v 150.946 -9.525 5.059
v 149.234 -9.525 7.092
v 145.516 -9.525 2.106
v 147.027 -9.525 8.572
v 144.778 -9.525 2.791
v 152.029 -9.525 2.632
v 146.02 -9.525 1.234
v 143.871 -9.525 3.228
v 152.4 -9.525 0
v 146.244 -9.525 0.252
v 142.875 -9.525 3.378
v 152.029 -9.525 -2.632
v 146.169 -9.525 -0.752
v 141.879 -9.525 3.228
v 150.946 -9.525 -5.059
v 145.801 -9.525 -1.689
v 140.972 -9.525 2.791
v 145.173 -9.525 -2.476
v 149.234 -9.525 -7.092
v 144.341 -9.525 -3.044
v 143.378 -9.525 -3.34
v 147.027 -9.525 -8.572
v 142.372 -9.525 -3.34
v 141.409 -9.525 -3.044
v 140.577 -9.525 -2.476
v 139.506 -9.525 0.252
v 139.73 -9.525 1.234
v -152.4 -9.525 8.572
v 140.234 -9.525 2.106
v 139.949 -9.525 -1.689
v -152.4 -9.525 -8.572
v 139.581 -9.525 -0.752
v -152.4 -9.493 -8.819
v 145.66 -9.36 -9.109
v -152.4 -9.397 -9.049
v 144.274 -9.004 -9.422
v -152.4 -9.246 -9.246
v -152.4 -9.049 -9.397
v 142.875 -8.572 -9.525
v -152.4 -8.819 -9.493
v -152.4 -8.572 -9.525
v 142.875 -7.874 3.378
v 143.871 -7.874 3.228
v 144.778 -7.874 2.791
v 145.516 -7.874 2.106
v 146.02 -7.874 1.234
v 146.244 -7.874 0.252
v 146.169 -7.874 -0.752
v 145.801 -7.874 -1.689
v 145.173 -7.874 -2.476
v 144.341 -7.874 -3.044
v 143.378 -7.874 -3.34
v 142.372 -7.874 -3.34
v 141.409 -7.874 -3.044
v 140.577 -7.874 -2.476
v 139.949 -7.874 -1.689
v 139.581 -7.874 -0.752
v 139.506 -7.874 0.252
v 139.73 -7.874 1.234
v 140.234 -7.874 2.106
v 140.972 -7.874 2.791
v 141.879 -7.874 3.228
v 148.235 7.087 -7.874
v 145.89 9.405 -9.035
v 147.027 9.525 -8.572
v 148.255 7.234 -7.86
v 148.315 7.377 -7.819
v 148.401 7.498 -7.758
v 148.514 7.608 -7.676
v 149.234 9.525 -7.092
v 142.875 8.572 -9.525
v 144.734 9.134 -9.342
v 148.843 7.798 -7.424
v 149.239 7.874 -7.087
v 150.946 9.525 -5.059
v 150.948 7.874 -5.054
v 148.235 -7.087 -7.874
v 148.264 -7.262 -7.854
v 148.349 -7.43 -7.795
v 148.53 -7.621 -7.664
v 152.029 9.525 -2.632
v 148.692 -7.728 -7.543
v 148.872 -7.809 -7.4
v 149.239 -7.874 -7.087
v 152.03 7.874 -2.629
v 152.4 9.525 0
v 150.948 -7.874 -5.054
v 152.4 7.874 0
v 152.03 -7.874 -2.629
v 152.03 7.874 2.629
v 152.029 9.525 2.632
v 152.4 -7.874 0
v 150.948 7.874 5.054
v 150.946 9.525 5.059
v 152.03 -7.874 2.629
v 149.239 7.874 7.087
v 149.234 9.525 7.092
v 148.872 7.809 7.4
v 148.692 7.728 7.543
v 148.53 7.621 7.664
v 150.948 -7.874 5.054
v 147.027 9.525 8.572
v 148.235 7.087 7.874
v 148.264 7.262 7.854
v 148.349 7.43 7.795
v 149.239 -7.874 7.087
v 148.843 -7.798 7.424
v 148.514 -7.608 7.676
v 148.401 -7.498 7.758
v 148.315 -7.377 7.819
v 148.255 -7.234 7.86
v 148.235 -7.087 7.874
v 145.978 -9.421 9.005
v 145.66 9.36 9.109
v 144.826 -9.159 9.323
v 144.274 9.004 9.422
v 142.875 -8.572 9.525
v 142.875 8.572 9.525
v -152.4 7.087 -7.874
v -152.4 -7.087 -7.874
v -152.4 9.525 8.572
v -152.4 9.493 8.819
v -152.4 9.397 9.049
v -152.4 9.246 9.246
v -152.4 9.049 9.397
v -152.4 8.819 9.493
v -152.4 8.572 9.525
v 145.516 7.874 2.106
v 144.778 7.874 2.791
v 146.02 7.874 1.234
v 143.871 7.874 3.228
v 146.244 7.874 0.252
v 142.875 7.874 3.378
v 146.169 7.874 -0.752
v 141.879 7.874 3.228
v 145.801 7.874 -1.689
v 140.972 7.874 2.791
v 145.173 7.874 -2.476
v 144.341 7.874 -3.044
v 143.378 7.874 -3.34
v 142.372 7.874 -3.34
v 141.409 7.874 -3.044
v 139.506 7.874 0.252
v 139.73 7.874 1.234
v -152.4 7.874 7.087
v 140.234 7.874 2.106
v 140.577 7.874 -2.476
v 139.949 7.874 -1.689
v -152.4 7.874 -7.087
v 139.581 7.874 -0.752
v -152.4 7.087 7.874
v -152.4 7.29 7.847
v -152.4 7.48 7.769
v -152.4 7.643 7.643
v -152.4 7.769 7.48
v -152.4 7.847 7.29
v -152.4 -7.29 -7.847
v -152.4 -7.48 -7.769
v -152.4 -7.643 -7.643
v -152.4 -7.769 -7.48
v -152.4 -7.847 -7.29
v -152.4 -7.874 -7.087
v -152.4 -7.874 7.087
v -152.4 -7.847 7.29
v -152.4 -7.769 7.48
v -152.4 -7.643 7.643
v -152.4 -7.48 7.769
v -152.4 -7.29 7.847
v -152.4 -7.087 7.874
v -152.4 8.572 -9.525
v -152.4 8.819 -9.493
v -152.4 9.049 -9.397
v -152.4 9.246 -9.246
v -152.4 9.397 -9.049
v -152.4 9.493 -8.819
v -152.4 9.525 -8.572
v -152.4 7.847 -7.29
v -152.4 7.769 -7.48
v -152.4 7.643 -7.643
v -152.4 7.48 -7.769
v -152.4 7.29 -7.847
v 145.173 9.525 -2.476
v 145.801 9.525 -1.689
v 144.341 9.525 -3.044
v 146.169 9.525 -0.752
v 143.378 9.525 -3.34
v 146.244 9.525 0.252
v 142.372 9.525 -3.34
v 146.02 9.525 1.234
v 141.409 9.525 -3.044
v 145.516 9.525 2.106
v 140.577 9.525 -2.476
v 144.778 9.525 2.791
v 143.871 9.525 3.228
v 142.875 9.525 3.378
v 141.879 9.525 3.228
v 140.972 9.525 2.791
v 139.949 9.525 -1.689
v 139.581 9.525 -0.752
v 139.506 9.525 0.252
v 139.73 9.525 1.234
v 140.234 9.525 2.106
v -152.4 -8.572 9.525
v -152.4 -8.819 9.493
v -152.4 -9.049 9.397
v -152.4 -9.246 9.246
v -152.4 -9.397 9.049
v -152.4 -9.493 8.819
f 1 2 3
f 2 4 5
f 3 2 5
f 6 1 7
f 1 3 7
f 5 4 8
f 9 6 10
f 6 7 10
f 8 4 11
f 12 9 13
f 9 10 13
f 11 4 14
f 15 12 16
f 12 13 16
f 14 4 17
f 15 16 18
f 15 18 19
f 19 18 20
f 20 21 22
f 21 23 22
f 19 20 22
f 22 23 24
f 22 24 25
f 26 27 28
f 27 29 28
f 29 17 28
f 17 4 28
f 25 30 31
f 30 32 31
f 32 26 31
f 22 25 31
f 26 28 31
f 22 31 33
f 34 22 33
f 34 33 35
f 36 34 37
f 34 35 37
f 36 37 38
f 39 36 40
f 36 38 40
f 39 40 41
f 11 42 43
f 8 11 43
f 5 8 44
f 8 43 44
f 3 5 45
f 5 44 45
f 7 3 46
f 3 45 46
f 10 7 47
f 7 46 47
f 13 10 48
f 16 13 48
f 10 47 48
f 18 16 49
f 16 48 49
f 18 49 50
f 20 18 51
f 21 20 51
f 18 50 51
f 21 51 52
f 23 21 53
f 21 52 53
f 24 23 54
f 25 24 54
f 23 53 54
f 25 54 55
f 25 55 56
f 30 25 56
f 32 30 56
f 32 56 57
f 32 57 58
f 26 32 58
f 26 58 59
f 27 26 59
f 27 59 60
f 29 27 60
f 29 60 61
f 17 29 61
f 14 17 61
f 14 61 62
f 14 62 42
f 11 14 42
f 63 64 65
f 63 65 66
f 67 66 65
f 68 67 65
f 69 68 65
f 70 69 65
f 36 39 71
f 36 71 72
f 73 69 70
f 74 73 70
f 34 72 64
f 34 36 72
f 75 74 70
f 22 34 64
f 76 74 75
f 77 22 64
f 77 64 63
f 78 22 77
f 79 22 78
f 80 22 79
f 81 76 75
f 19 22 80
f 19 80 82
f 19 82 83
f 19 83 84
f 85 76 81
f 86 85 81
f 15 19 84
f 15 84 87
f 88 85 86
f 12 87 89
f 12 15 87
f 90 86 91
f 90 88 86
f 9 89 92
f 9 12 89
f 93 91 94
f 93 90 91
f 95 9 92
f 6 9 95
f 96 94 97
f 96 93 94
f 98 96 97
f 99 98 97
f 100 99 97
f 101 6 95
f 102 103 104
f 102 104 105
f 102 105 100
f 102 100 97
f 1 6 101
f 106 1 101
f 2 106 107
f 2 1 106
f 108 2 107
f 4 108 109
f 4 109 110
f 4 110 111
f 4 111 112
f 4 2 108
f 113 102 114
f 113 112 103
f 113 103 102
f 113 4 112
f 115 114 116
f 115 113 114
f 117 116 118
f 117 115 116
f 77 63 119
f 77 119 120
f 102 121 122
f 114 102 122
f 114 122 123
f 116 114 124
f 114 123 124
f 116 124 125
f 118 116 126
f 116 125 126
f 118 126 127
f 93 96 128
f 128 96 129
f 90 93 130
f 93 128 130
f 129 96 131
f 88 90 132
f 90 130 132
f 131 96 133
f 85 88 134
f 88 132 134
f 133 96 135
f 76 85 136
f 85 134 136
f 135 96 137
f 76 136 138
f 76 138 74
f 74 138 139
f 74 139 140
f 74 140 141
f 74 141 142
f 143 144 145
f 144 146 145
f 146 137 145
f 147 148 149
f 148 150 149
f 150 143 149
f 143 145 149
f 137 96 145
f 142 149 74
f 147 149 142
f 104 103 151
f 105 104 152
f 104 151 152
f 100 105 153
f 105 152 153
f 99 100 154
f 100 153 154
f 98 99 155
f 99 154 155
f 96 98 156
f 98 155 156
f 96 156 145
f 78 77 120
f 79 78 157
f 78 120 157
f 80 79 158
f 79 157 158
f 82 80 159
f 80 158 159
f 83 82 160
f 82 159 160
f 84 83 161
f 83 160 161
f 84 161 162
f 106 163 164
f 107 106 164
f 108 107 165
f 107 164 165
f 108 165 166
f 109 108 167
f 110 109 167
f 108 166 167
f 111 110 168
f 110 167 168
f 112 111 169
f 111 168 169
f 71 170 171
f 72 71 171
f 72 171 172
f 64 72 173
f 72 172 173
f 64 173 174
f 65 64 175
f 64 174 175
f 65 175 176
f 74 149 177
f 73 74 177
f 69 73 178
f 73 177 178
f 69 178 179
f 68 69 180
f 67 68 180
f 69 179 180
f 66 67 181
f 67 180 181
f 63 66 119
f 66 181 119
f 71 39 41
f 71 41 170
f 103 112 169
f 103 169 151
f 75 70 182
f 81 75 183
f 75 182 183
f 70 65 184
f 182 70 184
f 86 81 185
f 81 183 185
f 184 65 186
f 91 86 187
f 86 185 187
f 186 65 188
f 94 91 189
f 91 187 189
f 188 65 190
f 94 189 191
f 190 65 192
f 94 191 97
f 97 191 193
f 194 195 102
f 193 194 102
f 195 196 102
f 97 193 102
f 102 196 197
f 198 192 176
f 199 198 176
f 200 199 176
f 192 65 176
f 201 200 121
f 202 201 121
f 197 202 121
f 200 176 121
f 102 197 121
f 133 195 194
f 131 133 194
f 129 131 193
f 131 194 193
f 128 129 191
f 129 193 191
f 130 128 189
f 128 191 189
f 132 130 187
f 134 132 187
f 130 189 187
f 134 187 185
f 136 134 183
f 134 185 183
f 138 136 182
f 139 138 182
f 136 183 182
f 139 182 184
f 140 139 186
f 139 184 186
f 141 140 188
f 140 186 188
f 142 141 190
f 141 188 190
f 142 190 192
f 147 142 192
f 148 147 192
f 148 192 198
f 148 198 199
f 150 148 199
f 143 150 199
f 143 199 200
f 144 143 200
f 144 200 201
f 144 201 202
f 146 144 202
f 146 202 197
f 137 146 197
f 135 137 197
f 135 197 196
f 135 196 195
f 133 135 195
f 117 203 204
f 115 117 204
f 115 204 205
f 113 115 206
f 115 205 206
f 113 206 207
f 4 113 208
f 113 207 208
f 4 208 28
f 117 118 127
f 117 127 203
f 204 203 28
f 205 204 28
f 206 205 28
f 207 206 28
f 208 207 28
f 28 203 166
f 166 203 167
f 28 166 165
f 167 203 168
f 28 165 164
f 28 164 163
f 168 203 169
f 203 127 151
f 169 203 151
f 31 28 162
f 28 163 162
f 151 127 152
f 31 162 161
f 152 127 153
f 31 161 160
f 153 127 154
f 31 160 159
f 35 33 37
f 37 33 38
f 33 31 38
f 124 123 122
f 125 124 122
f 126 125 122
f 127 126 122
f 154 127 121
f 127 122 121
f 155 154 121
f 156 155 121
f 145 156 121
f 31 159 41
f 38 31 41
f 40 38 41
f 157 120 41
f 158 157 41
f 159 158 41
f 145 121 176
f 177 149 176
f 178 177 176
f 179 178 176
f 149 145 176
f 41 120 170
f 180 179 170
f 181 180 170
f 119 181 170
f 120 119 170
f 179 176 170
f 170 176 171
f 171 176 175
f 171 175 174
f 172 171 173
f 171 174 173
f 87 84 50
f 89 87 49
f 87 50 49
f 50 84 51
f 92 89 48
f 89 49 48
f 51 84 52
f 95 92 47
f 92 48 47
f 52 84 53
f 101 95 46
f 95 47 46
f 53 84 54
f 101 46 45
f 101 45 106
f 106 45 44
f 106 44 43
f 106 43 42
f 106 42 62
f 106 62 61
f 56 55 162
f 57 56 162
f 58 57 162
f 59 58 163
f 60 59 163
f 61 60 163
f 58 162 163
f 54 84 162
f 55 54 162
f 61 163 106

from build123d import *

# Parameters (mm, degrees)
BOSS_EXTRUDE1_DEPTH      = 152.4
BOSS_EXTRUDE1_DEPTH_BACK = 152.4
CUT_EXTRUDE1_DEPTH       = 154.881084364
SKETCH6_R                = 3.3782
CUT_EXTRUDE2_DEPTH       = 154.881084481


with BuildPart() as part:
    # Sketch4 → Boss-Extrude1 (new, two sides: drawn at the far end of the back side and taken through both)
    with BuildSketch(Plane(origin=(0, 0, 0), x_dir=(0, 0, -1), z_dir=(1, 0, 0)).offset(-BOSS_EXTRUDE1_DEPTH_BACK)):
        with BuildLine():
            Line((9.525, -8.5725), (9.525, 8.5725))
            ThreePointArc((9.525, 8.5725), (9.246019209, 9.246019209), (8.5725, 9.525))
            Line((8.5725, 9.525), (-8.5725, 9.525))
            ThreePointArc((-8.5725, 9.525), (-9.246019209, 9.246019209), (-9.525, 8.5725))
            Line((-9.525, 8.5725), (-9.525, -8.5725))
            ThreePointArc((-9.525, -8.5725), (-9.246019209, -9.246019209), (-8.5725, -9.525))
            Line((-8.5725, -9.525), (8.5725, -9.525))
            ThreePointArc((8.5725, -9.525), (9.246019209, -9.246019209), (9.525, -8.5725))
        make_face()
        with BuildLine():
            Line((7.874, 7.0866), (7.874, -7.0866))
            ThreePointArc((7.874, -7.0866), (7.64337588, -7.64337588), (7.0866, -7.874))
            Line((7.0866, -7.874), (-7.0866, -7.874))
            ThreePointArc((-7.0866, -7.874), (-7.64337588, -7.64337588), (-7.874, -7.0866))
            Line((-7.874, -7.0866), (-7.874, 7.0866))
            ThreePointArc((-7.874, 7.0866), (-7.64337588, 7.64337588), (-7.0866, 7.874))
            Line((-7.0866, 7.874), (7.0866, 7.874))
            ThreePointArc((7.0866, 7.874), (7.64337588, 7.64337588), (7.874, 7.0866))
        make_face(mode=Mode.SUBTRACT)
    extrude(amount=BOSS_EXTRUDE1_DEPTH + BOSS_EXTRUDE1_DEPTH_BACK)

    # Sketch5 → Cut-Extrude1 (cut, through all)
    with BuildSketch(Plane.XZ.offset(9.525)):
        with BuildLine():
            Line((152.4, -9.525), (142.875, -9.525))
            ThreePointArc((142.875, -9.525), (152.4, 0), (142.875, 9.525))
            Line((142.875, 9.525), (152.4, 9.525))
            Line((152.4, 9.525), (157.48, 9.525))
            Line((157.48, 9.525), (157.48, -9.525))
            Line((157.48, -9.525), (152.4, -9.525))
        make_face()
    extrude(amount=-CUT_EXTRUDE1_DEPTH, mode=Mode.SUBTRACT)

    # Sketch6 → Cut-Extrude2 (cut, through all)
    with BuildSketch(Plane(origin=(0, 9.525, 0), x_dir=(1, 0, 0), z_dir=(0, 1, 0))):
        with Locations(Location((142.875, 0, 0), (0, 0, 270))):
            Circle(SKETCH6_R)
    extrude(amount=-CUT_EXTRUDE2_DEPTH, mode=Mode.SUBTRACT)


solid = part.part
